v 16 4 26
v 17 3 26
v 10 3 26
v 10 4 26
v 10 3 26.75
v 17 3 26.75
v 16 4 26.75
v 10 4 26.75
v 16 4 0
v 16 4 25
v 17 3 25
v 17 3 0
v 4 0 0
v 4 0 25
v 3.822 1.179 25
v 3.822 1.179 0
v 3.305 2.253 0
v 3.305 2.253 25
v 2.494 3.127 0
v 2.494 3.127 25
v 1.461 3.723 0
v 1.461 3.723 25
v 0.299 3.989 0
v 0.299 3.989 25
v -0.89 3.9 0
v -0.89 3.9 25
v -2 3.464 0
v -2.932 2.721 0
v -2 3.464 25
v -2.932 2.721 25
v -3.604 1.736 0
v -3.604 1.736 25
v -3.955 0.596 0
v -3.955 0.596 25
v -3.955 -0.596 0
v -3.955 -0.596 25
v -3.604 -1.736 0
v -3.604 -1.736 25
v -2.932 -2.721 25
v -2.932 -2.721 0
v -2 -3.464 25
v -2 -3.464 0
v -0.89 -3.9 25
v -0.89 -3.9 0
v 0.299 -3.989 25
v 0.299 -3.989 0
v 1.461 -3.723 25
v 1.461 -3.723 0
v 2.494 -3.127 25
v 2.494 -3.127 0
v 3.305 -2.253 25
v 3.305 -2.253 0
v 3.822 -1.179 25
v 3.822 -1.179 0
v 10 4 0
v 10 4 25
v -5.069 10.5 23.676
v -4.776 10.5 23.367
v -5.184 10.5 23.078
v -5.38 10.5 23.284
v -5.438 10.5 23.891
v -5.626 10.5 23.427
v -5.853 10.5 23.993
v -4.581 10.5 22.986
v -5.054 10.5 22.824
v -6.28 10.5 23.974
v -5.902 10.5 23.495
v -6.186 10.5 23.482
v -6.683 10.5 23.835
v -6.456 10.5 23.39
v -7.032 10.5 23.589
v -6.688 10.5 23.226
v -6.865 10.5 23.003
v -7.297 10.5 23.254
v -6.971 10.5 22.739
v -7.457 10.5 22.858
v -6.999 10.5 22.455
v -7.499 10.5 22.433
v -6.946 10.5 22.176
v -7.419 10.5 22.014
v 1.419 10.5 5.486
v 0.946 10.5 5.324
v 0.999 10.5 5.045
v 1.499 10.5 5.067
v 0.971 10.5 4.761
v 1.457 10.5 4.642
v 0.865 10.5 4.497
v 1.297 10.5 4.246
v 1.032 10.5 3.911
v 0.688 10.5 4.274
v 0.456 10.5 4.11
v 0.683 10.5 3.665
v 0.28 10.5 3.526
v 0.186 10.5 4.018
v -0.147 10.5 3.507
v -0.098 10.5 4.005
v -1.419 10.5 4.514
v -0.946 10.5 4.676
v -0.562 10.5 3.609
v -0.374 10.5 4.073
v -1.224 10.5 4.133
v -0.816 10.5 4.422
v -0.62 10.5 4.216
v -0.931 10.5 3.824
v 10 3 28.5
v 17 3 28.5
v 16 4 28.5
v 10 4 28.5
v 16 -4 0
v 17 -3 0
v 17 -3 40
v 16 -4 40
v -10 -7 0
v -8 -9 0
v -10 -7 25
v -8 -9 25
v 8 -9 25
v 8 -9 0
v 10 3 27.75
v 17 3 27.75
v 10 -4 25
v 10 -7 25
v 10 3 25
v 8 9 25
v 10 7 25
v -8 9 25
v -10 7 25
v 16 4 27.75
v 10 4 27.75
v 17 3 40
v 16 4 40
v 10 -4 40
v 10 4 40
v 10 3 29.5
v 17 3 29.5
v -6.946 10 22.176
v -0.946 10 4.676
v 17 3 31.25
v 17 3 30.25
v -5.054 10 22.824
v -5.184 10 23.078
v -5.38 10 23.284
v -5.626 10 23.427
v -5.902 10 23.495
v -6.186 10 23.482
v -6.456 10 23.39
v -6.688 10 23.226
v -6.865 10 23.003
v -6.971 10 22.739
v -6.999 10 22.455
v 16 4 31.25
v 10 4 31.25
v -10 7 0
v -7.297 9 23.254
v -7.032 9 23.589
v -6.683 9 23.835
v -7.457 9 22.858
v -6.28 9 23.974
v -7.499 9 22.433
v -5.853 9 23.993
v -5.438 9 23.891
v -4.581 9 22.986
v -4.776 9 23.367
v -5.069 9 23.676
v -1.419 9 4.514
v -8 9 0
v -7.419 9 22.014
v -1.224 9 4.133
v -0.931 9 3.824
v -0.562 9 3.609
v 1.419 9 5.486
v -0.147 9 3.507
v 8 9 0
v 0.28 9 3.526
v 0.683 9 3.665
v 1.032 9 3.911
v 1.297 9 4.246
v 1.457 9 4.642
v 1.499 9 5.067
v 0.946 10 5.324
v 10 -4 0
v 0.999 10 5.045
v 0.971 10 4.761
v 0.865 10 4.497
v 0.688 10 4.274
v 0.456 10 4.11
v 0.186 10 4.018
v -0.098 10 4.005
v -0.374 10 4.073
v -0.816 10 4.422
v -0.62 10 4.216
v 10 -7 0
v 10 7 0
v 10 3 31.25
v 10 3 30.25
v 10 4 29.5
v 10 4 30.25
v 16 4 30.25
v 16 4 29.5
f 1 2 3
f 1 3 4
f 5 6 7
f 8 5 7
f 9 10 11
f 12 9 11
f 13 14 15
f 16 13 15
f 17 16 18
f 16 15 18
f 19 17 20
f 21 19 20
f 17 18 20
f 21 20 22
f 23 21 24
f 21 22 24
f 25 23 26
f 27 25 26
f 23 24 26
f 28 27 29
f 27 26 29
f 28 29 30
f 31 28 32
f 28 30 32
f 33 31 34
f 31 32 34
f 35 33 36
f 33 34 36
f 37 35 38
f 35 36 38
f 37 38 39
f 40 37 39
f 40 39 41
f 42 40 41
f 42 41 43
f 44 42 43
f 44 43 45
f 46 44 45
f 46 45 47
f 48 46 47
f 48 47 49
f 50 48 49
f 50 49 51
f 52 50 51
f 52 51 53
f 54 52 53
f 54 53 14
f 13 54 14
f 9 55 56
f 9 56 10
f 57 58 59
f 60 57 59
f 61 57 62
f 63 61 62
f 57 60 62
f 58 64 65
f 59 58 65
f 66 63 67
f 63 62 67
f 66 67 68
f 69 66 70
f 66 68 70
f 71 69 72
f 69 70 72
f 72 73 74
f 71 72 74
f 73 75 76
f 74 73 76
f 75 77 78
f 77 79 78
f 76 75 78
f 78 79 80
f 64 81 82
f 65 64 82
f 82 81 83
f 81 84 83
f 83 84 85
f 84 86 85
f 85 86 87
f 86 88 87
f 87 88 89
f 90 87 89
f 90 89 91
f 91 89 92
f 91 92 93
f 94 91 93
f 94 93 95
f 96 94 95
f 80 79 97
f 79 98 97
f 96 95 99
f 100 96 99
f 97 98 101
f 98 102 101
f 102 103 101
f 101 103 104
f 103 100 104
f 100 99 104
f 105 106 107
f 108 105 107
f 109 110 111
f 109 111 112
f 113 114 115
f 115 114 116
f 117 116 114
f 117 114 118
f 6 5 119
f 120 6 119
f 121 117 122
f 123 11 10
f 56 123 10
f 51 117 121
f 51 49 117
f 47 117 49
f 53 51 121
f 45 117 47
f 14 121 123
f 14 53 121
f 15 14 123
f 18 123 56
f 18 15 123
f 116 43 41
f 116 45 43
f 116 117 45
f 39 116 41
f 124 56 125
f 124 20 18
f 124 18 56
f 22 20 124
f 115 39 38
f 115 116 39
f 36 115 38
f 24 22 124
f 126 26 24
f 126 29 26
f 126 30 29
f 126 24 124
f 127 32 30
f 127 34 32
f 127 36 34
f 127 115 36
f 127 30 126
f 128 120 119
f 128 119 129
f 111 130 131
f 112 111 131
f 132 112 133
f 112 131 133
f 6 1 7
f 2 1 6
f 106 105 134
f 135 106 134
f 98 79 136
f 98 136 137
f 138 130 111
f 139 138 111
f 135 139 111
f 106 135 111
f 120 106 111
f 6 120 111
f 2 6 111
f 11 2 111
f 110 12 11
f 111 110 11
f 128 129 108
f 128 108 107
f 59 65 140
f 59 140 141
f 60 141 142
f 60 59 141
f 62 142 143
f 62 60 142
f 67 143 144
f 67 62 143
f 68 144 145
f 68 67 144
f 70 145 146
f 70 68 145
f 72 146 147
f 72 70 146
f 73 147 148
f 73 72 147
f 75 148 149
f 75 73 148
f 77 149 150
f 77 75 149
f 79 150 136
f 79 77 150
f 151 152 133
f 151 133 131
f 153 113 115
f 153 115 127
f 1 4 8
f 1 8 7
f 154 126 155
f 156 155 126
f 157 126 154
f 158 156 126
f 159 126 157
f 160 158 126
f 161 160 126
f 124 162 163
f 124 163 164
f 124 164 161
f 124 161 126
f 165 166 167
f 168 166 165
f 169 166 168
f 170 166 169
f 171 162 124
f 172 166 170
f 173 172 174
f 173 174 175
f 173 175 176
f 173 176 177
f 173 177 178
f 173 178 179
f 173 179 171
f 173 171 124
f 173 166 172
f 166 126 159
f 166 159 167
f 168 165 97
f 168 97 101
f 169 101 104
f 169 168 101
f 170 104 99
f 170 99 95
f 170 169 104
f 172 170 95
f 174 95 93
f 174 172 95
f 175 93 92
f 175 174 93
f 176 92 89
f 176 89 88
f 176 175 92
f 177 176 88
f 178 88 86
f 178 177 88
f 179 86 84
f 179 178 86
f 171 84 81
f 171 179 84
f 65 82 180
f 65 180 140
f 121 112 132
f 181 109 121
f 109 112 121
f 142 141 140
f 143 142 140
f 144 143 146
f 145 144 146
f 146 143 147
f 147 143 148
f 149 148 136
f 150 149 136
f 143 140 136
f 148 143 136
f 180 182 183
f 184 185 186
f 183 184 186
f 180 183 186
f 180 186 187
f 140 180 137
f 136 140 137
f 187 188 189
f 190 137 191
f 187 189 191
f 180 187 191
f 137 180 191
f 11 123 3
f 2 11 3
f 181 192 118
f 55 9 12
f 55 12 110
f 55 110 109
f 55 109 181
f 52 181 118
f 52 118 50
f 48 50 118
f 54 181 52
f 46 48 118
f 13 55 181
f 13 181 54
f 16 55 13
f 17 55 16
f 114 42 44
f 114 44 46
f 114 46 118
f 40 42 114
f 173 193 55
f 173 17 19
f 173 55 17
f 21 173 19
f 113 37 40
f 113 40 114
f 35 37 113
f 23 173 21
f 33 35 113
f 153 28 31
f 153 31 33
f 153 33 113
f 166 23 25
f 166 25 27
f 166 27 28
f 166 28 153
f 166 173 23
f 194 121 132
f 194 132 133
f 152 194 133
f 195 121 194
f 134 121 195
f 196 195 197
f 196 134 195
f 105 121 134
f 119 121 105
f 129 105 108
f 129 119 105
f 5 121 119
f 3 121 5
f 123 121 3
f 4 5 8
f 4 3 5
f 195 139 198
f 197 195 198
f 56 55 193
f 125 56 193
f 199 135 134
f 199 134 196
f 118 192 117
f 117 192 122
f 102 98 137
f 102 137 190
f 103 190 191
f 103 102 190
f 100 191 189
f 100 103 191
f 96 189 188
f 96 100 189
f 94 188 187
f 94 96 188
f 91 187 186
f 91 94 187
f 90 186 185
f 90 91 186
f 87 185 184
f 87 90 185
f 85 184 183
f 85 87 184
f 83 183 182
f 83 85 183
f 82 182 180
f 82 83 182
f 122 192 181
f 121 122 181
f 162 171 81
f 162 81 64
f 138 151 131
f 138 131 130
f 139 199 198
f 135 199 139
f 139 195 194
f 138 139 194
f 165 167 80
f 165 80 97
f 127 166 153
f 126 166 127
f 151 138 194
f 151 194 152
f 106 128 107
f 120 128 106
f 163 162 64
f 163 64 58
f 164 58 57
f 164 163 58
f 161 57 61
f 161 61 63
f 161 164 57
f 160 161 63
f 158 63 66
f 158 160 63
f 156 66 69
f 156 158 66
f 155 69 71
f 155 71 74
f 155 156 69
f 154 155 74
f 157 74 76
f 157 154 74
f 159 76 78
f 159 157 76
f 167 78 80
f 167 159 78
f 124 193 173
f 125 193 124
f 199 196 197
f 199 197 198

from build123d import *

# Parameters (mm, degrees)
SKETCH1_W           = 20
SKETCH1_H           = 18
BOSS_EXTRUDE1_DEPTH = 25
SKETCH2_R           = 4
CUT_EXTRUDE1_DEPTH  = 26
CHAMFER1_SIZE       = 2
BOSS_EXTRUDE2_DEPTH = 1.5
CUT_EXTRUDE2_DEPTH  = 0.5
BOSS_EXTRUDE3_DEPTH = 40
SKETCH6_W           = 1
SKETCH6_H           = 1
CUT_EXTRUDE3_DEPTH  = 8


with BuildPart() as part:
    # Sketch1 → Boss-Extrude1 (new body)
    with BuildSketch(Plane.XY):
        Rectangle(SKETCH1_W, SKETCH1_H)
    extrude(amount=BOSS_EXTRUDE1_DEPTH)

    # Sketch2 → Cut-Extrude1 (cut, through all)
    with BuildSketch(Plane.XY.offset(25)):
        Circle(SKETCH2_R)
    extrude(amount=-CUT_EXTRUDE1_DEPTH, mode=Mode.SUBTRACT)

    # Chamfer1
    chamfer1_edges = [part.edges().sort_by_distance(p)[0] for p in [
        (10, 9, 12.5),
        (10, -9, 12.5),
        (-10, -9, 12.5),
        (-10, 9, 12.5),
    ]]
    chamfer(chamfer1_edges, length=CHAMFER1_SIZE)

    # Sketch3 → Boss-Extrude2 (add)
    with BuildSketch(Plane(origin=(0, 9, 0), x_dir=(1, 0, 0), z_dir=(0, 1, 0))):
        with BuildLine():
            Line((-7.418918919, -22.013513514), (-1.418918919, -4.513513514))
            ThreePointArc((-1.418918919, -4.513513514), (0.486486486, -3.581081081), (1.418918919, -5.486486486))
            Line((1.418918919, -5.486486486), (-4.581081081, -22.986486486))
            ThreePointArc((-4.581081081, -22.986486486), (-6.486486486, -23.918918919), (-7.418918919, -22.013513514))
        make_face()
    extrude(amount=BOSS_EXTRUDE2_DEPTH)

    # Sketch4 → Cut-Extrude2 (cut)
    with BuildSketch(Plane(origin=(0, 10.5, 0), x_dir=(1, 0, 0), z_dir=(0, 1, 0))):
        with BuildLine():
            Line((-6.945945946, -22.175675676), (-0.945945946, -4.675675676))
            ThreePointArc((-0.945945946, -4.675675676), (0.324324324, -4.054054054), (0.945945946, -5.324324324))
            Line((0.945945946, -5.324324324), (-5.054054054, -22.824324324))
            ThreePointArc((-5.054054054, -22.824324324), (-6.324324324, -23.445945946), (-6.945945946, -22.175675676))
        make_face()
    extrude(amount=-CUT_EXTRUDE2_DEPTH, mode=Mode.SUBTRACT)

    # Sketch5 → Boss-Extrude3 (add)
    with BuildSketch(Plane(origin=(0, 0, 0), x_dir=(-1, 0, 0), z_dir=(0, 0, -1))):
        Polygon((-10, 4), (-16, 4), (-17, 3), (-17, -3), (-16, -4), (-10, -4), align=None)
    extrude(amount=-BOSS_EXTRUDE3_DEPTH)

    # Sketch6 → Cut-Extrude3 (cut, through all)
    with BuildSketch(Plane.ZY.offset(-10)):
        with Locations((25.5, 3.5)):
            Rectangle(SKETCH6_W, SKETCH6_H)
        with Locations((27.25, 3.5)):
            Rectangle(SKETCH6_W, SKETCH6_H)
        with Locations((29, 3.5)):
            Rectangle(SKETCH6_W, SKETCH6_H)
        with Locations((30.75, 3.5)):
            Rectangle(SKETCH6_W, SKETCH6_H)
    extrude(amount=-CUT_EXTRUDE3_DEPTH, mode=Mode.SUBTRACT)


solid = part.part
